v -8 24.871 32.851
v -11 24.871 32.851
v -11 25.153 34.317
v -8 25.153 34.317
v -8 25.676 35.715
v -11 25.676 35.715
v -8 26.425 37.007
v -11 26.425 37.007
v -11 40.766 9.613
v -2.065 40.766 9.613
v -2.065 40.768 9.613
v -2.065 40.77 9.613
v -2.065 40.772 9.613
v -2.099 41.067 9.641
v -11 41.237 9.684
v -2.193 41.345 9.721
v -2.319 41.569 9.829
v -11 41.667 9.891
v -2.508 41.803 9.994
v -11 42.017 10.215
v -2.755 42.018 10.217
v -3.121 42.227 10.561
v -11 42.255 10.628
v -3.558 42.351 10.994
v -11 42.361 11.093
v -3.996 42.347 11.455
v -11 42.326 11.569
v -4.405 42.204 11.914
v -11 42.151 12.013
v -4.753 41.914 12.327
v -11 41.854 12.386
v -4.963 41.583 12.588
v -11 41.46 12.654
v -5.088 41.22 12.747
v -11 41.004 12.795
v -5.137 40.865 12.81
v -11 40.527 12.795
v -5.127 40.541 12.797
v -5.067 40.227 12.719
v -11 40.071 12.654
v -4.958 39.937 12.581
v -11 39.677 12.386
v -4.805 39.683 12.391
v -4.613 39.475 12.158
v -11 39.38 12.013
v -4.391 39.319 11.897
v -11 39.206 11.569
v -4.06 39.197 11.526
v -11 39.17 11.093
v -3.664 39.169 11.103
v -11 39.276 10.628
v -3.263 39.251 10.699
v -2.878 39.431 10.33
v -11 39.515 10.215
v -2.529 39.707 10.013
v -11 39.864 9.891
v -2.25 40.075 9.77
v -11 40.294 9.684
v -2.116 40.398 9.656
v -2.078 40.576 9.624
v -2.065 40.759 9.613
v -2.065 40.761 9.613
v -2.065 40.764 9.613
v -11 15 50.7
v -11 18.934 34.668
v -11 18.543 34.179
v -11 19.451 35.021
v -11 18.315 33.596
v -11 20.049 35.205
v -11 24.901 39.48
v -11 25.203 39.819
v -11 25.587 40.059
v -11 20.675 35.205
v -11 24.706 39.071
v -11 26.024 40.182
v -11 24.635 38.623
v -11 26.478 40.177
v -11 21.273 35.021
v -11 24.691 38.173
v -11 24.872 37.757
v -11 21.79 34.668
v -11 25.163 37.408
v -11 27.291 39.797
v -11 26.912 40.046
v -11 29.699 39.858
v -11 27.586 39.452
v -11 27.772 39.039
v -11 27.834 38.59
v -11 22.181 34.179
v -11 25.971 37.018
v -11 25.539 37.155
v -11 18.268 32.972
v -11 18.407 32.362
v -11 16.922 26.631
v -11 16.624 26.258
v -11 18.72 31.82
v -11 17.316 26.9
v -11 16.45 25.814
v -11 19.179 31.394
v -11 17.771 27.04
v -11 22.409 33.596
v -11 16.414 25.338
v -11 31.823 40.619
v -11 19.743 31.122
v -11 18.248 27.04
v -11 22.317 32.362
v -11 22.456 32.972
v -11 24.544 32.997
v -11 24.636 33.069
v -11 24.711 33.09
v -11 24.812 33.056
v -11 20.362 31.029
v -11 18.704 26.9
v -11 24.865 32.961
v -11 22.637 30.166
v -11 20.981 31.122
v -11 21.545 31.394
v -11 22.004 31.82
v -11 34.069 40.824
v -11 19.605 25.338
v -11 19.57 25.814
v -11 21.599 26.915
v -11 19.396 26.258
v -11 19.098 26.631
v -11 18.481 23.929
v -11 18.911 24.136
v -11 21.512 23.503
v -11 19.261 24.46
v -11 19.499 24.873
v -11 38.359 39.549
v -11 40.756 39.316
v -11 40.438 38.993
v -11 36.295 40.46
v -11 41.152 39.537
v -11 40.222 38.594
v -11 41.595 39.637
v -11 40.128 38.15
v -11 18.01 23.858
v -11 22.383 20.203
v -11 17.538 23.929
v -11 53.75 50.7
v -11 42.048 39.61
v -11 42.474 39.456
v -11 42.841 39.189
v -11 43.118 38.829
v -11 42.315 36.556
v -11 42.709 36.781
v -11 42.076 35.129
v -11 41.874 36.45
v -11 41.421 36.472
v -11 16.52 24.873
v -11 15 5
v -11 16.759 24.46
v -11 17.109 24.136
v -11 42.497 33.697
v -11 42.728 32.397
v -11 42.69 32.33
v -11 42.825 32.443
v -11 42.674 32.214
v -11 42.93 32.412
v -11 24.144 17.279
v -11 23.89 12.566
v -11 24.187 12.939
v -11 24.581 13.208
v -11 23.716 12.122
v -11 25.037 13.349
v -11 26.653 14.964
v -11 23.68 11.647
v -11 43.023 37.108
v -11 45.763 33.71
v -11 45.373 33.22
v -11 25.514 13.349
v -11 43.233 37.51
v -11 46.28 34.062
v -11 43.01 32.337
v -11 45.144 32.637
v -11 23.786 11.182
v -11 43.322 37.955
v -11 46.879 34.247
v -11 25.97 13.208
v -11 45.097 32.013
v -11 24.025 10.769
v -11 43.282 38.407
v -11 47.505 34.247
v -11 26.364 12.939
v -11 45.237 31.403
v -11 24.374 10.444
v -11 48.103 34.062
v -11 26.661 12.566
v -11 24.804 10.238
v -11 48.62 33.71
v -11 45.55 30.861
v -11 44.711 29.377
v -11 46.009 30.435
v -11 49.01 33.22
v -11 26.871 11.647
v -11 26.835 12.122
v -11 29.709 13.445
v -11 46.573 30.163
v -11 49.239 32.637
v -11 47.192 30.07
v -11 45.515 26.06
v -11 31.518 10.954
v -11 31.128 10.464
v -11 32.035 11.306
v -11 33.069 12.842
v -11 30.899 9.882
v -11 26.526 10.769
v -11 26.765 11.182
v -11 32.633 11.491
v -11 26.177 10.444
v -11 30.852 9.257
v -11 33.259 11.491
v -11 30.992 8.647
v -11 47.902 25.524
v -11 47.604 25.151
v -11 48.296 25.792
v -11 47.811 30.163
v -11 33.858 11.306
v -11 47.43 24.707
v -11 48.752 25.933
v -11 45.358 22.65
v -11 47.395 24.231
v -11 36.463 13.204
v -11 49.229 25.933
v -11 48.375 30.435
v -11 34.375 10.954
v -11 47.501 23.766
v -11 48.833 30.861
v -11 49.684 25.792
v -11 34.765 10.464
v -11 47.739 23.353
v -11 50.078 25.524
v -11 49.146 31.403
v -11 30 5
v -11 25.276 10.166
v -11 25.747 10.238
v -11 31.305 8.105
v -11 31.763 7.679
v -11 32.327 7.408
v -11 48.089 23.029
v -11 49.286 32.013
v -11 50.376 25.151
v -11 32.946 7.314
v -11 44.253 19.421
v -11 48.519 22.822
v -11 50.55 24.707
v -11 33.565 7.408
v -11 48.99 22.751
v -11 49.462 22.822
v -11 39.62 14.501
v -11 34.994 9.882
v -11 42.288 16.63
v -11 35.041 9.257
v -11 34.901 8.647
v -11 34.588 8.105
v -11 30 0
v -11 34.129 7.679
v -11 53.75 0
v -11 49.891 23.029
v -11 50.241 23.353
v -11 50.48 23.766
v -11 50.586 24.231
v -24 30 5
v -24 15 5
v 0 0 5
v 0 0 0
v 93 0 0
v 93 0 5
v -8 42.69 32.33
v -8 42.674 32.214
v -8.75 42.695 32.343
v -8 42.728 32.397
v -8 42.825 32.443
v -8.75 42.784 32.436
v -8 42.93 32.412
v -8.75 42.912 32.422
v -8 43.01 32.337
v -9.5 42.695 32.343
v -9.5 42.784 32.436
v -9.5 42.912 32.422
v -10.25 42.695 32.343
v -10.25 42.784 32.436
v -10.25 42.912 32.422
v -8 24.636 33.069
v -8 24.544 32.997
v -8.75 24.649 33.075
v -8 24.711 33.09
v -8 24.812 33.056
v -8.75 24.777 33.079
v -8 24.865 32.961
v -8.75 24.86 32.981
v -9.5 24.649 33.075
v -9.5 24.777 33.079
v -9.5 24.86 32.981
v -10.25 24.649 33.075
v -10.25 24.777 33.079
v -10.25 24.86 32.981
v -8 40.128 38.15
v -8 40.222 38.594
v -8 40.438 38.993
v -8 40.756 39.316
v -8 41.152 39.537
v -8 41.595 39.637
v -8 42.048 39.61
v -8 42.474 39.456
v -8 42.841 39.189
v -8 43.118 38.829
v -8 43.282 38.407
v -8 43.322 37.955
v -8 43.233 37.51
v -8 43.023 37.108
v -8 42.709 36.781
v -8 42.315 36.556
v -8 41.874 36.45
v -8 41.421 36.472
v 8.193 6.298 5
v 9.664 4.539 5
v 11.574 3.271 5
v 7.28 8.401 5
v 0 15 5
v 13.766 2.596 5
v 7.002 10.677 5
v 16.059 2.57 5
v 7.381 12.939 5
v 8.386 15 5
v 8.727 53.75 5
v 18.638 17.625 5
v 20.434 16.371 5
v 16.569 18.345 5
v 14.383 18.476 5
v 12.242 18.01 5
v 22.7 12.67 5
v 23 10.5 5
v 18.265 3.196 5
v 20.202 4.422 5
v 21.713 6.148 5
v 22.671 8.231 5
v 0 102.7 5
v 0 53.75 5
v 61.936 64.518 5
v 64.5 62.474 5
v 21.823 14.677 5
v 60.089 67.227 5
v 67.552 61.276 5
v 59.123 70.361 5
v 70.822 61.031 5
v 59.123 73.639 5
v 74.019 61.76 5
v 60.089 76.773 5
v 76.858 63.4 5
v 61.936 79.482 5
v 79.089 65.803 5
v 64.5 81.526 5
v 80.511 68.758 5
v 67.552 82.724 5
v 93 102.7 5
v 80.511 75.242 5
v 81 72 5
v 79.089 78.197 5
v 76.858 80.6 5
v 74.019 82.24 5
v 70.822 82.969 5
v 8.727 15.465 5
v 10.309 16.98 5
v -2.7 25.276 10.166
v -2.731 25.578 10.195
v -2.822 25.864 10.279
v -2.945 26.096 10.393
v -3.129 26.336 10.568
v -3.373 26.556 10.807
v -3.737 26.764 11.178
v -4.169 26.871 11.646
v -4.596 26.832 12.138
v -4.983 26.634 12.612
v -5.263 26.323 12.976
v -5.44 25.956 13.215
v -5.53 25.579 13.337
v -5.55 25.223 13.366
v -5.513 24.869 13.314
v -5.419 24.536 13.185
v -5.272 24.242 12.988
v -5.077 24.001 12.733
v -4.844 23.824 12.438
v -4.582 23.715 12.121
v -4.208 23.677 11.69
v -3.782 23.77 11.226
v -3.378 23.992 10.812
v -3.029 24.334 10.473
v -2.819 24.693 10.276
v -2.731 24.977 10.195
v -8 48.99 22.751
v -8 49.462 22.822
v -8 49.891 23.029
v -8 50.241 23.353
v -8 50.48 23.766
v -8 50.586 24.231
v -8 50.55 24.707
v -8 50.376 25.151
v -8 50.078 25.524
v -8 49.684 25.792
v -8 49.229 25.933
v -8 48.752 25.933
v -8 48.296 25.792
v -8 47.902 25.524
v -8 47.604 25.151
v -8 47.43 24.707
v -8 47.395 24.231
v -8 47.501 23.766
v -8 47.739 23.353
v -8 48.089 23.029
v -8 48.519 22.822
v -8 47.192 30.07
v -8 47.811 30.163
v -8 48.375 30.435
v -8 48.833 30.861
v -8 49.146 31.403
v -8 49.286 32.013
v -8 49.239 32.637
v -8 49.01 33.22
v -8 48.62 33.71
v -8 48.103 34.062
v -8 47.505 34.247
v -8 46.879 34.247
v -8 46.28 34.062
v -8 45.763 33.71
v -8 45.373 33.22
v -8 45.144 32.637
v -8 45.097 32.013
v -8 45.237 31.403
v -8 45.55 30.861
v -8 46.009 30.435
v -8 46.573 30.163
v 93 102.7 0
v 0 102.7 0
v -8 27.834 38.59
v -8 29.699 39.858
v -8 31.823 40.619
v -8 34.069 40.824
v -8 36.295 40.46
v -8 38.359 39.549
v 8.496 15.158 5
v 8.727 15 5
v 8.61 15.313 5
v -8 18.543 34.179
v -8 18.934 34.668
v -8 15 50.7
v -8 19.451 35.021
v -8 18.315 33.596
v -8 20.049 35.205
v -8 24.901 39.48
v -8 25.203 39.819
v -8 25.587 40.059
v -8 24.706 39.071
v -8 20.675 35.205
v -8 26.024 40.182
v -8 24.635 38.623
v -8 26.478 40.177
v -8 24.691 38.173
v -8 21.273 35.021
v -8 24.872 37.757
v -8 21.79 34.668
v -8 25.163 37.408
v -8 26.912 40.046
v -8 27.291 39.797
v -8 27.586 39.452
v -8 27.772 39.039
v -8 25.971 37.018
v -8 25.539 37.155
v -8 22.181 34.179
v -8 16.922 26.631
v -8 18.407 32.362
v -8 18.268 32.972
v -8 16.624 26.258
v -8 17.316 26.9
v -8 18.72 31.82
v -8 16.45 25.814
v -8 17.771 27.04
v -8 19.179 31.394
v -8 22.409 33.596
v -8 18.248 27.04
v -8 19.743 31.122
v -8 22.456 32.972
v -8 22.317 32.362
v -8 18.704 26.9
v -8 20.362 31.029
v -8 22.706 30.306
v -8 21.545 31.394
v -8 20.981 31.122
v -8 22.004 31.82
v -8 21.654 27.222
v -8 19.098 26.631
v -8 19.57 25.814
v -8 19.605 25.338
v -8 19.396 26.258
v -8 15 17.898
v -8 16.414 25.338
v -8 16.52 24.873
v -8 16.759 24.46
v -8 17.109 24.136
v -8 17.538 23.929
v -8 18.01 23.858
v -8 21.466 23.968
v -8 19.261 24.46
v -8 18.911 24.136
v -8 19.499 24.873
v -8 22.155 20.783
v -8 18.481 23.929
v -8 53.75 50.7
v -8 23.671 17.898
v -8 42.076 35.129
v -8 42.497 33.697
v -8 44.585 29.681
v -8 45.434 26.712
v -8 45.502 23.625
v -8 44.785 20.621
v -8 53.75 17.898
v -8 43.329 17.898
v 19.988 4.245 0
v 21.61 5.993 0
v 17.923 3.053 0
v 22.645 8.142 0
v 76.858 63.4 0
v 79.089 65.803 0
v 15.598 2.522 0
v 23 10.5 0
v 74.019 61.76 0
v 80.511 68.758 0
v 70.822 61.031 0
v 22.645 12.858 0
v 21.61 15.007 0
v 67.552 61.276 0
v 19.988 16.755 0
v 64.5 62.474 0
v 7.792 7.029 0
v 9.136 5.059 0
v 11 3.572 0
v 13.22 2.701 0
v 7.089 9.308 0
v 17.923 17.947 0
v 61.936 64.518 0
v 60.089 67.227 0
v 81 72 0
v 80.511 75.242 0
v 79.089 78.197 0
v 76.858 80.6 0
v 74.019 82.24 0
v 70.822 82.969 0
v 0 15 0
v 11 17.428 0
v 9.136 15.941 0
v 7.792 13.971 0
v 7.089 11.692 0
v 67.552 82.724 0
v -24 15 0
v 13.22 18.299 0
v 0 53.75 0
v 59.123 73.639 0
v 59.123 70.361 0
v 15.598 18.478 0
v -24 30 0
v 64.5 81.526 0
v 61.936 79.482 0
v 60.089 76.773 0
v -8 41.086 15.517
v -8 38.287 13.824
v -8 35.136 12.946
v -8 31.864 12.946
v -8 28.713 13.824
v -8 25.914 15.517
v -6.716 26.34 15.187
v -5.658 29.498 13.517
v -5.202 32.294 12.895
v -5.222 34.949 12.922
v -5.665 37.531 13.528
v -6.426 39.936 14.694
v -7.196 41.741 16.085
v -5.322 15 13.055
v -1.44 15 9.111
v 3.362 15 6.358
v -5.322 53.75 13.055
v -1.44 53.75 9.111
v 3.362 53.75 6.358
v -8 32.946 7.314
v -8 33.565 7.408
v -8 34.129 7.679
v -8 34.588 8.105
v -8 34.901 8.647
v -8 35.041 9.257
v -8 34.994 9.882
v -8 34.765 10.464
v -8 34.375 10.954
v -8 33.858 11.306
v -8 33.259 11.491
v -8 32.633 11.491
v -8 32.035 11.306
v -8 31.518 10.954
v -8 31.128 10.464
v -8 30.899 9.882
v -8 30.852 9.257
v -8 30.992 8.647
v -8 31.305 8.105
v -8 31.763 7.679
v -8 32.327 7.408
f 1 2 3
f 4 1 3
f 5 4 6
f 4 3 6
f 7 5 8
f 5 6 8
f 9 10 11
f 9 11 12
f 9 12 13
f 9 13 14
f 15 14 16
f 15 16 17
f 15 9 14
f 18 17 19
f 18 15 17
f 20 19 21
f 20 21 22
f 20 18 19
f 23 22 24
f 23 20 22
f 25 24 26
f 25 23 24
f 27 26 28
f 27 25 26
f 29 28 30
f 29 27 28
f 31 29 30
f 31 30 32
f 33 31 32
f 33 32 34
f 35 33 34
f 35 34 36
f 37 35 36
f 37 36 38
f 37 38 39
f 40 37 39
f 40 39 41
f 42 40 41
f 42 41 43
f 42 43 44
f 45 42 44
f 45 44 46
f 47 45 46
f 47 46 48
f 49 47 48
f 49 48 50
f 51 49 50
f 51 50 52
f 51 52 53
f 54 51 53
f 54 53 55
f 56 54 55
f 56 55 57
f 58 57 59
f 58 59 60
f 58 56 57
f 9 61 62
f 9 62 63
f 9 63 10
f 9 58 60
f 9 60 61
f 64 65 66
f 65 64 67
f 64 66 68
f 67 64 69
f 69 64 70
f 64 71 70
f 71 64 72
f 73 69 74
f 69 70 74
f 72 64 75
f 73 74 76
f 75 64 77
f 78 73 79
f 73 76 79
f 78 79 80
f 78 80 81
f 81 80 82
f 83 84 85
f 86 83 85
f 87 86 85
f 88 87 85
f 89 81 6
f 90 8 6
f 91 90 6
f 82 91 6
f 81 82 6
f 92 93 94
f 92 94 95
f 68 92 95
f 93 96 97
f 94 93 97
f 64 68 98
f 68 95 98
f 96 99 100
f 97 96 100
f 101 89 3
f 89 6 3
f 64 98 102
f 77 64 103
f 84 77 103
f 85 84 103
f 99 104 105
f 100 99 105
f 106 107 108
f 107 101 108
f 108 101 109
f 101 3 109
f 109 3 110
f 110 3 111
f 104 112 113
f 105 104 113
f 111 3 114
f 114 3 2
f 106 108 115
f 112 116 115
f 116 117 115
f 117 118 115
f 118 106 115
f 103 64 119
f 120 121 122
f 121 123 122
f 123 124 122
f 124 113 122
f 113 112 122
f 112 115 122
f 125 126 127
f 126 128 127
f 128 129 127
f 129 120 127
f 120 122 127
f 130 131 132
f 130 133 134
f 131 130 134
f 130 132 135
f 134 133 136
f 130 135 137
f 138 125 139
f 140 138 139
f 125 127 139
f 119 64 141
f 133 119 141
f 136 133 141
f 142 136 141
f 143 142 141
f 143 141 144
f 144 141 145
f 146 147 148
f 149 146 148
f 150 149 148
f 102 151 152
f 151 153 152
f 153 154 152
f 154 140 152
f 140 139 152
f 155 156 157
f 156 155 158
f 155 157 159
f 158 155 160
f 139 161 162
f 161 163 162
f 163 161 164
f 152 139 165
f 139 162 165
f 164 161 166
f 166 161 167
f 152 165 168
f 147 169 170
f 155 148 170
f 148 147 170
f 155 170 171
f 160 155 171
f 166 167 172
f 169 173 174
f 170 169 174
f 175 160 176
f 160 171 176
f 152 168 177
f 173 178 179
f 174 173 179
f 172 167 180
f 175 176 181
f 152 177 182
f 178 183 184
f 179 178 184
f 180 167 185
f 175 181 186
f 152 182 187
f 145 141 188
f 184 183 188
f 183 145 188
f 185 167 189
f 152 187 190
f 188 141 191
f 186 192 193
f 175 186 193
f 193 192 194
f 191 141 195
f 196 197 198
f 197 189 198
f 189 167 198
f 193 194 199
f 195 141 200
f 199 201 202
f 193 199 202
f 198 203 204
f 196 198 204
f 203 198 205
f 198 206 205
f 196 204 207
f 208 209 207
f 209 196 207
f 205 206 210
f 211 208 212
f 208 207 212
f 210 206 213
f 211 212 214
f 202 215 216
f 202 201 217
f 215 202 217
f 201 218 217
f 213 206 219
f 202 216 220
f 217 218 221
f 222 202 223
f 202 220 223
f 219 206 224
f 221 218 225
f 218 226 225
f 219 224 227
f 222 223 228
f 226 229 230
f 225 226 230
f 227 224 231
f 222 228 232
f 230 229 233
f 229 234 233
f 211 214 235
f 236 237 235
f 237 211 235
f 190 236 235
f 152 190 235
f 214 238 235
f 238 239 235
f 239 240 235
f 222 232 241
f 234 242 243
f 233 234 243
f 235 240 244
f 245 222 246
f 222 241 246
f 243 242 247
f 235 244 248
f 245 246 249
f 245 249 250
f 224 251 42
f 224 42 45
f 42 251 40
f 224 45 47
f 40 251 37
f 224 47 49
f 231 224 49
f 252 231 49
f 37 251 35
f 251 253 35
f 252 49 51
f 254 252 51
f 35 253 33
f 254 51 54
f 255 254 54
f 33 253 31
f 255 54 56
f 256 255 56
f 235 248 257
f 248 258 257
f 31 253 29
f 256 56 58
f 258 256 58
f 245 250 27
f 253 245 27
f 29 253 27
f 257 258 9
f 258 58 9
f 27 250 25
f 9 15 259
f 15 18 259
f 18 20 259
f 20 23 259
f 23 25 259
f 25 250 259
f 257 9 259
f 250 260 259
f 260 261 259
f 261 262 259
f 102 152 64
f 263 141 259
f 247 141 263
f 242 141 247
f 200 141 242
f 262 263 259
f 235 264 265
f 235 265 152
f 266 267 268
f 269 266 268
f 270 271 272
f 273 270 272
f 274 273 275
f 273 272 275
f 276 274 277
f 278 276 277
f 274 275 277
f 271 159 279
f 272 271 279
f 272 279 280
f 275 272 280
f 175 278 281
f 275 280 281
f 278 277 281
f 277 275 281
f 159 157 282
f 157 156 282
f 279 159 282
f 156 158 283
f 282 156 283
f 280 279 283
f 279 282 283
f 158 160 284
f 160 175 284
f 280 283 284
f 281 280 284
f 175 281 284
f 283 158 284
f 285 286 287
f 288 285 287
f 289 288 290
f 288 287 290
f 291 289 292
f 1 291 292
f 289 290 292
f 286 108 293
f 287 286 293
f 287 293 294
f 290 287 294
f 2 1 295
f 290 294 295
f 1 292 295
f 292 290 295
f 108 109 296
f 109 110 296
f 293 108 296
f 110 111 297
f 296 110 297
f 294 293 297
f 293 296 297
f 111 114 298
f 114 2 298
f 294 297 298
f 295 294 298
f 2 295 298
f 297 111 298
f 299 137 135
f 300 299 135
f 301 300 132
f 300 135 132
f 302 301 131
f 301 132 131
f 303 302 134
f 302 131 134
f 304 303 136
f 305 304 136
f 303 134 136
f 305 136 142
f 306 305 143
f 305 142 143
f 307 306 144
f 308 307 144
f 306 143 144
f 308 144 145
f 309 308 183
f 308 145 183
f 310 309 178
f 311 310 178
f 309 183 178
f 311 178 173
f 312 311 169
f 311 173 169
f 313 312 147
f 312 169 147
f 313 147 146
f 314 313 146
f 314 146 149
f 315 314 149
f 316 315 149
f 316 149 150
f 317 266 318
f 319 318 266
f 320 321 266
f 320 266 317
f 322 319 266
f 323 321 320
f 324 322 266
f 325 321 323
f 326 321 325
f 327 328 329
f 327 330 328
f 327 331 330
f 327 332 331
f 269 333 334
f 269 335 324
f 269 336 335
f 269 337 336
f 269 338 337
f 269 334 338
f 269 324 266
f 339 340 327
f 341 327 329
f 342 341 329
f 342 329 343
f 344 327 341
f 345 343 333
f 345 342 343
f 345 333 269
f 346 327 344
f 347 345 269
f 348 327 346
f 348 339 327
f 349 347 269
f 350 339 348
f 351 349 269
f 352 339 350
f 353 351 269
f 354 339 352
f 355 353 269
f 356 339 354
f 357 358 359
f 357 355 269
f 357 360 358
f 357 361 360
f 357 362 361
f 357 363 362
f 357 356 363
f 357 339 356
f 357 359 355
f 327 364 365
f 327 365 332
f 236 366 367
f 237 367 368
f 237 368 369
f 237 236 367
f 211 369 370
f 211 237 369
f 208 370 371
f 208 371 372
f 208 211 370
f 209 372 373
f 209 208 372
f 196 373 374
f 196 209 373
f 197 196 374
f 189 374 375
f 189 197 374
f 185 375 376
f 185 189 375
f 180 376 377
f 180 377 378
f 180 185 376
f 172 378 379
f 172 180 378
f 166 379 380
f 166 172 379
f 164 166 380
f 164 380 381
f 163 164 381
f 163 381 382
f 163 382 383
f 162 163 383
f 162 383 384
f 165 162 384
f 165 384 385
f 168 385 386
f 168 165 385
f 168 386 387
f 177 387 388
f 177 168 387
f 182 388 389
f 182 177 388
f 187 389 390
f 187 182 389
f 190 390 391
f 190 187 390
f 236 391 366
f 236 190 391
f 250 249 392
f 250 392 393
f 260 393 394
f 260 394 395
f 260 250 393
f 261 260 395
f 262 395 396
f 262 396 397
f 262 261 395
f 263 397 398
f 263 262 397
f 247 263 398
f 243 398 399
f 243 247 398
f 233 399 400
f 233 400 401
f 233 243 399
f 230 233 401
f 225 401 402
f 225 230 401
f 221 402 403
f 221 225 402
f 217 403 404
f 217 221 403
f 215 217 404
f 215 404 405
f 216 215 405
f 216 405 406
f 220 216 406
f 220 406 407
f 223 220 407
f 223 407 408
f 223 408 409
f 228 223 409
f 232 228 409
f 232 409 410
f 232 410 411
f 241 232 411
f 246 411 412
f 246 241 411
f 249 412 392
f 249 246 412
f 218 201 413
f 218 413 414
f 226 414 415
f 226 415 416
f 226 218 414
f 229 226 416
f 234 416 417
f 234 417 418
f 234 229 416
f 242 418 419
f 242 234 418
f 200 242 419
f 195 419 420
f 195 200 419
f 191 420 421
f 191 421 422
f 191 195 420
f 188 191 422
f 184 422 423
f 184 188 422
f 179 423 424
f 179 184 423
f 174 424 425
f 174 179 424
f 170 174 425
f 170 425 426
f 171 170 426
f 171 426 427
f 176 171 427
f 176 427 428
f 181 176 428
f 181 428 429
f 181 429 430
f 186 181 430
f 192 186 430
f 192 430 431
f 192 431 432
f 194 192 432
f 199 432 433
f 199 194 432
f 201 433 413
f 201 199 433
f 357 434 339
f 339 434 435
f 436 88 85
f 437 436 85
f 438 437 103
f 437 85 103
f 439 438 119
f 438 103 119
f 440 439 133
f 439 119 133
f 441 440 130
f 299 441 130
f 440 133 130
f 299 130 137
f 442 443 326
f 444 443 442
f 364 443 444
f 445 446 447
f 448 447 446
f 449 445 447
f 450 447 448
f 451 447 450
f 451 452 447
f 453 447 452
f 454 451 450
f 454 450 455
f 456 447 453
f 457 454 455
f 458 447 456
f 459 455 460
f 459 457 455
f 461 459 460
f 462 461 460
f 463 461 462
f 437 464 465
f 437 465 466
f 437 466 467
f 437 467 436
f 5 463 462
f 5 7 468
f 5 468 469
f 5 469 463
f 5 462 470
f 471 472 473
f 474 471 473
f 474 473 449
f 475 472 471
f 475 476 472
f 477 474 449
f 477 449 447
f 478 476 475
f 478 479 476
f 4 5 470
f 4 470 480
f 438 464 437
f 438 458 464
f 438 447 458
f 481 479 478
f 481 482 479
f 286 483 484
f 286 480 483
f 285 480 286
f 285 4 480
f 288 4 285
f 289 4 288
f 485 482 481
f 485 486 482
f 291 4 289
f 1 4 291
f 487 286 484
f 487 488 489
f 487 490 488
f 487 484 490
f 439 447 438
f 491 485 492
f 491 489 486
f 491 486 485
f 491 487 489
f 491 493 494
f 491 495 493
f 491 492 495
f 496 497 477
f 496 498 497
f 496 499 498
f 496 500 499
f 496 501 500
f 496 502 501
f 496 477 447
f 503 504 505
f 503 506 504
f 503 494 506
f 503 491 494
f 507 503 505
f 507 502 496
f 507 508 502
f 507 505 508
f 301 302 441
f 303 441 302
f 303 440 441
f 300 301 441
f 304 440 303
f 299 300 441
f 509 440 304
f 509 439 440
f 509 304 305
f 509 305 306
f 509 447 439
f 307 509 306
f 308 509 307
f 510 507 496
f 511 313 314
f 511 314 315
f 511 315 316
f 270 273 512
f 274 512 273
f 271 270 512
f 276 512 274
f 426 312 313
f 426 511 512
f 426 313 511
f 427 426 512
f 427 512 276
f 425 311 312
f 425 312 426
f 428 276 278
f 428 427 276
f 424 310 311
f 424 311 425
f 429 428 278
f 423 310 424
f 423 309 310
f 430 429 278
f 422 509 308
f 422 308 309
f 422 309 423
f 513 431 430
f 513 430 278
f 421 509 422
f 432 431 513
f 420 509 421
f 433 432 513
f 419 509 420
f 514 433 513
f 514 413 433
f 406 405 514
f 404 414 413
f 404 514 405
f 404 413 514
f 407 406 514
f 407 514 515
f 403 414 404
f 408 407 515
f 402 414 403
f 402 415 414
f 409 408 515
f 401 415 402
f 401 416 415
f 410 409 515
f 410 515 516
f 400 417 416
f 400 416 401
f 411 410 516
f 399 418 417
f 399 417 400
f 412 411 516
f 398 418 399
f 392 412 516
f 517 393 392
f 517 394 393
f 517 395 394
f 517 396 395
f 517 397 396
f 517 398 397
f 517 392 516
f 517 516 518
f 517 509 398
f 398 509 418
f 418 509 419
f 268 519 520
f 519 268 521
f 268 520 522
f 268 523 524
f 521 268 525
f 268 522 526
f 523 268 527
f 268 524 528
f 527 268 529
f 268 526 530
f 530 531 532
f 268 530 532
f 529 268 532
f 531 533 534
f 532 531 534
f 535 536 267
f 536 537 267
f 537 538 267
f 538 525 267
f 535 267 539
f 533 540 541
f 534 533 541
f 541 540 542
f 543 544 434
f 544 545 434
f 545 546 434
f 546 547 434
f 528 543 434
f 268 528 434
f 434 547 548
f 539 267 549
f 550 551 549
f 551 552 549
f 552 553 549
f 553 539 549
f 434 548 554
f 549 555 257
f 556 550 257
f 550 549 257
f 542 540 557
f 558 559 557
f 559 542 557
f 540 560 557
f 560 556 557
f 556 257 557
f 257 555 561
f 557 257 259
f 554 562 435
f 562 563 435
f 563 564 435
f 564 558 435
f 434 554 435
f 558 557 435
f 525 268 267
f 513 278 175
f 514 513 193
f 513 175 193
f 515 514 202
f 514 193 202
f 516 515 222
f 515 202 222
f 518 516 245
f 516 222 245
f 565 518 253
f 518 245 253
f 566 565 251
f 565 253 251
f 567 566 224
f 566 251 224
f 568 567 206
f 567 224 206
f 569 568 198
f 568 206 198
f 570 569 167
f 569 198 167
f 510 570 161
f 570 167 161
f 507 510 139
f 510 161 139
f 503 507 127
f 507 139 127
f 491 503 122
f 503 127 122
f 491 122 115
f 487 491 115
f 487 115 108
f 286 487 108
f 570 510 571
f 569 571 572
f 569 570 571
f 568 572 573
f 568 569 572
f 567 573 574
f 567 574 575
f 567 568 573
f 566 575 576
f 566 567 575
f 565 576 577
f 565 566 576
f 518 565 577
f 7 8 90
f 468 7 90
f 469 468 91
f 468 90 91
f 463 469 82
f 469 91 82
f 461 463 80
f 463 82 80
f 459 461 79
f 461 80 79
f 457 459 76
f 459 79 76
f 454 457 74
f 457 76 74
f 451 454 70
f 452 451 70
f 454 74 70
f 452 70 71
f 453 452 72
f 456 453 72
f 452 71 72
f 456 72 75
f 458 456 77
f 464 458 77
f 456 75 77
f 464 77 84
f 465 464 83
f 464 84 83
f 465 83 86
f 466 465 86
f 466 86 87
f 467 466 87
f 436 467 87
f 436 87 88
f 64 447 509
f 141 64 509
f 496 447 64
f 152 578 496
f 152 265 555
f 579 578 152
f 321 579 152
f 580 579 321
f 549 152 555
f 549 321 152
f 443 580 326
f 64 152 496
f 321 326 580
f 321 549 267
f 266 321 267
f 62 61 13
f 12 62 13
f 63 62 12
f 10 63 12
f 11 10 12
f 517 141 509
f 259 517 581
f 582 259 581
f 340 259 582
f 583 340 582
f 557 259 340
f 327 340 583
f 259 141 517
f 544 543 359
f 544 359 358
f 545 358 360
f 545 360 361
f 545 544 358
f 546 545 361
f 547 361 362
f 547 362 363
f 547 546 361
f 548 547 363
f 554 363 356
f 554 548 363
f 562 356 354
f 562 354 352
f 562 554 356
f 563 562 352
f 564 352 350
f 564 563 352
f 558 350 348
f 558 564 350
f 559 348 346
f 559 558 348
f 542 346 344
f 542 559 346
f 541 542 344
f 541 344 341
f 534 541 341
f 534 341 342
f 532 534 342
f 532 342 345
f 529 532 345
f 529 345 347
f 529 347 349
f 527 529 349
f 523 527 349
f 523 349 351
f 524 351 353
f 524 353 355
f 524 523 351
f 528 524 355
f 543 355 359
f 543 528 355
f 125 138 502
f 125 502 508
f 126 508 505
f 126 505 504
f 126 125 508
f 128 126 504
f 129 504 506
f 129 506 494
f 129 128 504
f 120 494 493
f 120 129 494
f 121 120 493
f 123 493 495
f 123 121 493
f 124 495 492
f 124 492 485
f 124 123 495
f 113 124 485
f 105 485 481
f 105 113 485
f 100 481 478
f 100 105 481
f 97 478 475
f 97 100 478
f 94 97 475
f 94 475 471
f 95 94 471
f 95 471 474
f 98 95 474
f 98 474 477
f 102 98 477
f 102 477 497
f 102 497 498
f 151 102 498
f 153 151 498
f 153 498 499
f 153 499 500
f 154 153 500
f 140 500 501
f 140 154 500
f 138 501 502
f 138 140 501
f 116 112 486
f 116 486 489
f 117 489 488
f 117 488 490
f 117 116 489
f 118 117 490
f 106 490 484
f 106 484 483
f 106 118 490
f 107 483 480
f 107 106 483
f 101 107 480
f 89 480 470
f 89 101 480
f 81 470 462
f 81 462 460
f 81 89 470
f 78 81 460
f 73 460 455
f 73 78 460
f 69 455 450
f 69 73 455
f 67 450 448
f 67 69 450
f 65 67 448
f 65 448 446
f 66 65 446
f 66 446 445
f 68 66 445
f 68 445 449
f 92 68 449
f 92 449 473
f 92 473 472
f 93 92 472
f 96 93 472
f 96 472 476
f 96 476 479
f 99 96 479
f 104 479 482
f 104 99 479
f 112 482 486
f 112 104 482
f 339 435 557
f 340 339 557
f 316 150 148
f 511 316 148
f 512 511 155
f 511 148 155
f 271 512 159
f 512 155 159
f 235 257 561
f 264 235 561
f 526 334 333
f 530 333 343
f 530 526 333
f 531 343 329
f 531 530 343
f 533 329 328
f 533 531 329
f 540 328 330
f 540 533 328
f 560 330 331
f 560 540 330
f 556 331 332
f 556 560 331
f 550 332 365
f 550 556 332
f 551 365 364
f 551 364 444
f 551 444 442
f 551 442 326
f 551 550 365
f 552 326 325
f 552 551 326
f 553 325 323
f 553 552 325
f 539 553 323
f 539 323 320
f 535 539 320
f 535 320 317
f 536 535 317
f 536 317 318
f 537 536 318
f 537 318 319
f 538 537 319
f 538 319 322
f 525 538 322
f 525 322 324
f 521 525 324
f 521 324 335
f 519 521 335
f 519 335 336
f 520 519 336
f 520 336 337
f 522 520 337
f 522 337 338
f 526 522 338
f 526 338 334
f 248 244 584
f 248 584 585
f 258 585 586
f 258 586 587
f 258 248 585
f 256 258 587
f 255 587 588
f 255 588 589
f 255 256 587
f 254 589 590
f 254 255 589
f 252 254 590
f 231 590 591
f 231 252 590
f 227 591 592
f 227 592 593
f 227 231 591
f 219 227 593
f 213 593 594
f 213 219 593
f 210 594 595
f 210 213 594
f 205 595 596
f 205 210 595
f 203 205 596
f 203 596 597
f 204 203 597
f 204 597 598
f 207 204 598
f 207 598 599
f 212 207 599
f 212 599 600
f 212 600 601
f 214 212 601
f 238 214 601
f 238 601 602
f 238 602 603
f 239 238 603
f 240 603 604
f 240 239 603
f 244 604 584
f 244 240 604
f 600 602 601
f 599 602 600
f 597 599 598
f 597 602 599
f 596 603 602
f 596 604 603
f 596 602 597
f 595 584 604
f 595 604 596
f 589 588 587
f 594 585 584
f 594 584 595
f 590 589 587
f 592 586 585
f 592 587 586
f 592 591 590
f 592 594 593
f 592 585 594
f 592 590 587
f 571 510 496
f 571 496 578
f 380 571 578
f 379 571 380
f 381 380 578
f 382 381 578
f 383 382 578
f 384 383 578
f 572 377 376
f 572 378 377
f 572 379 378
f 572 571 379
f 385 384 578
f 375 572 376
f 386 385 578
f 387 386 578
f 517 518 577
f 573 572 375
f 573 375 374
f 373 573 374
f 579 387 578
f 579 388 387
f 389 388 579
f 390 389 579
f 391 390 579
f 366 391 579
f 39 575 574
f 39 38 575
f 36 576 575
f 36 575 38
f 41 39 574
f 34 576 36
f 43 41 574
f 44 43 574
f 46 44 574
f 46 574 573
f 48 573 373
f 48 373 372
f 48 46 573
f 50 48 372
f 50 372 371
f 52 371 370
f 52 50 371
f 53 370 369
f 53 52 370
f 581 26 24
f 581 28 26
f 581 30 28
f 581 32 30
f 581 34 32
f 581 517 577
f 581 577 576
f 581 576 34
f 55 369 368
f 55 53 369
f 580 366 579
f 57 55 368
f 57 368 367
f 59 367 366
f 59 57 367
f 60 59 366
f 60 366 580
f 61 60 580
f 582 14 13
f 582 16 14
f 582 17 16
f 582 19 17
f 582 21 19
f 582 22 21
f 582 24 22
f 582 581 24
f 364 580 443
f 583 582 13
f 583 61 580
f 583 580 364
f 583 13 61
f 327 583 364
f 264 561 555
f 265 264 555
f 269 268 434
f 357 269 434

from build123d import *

# Parameters (mm, degrees)
SKETCH1_R                 = 8
SKETCH1_R_2               = 11
BOSS_EXTRUDE1_DEPTH       = 5
BOSS_EXTRUDE2_DEPTH       = 11
BOSS_EXTRUDE3_OUTLINE_R   = 1.6
BOSS_EXTRUDE3_OUTLINE_R_2 = 2.1
BOSS_EXTRUDE3_DEPTH       = 3
SKETCH3_W                 = 15
SKETCH3_H                 = 38.75
CUT_EXTRUDE1_DEPTH        = 3
BOSS_EXTRUDE4_REACH       = 120.779
CUT_EXTRUDE3_START        = 3
CUT_EXTRUDE3_OUTLINE_R    = 1.6
CUT_EXTRUDE3_DEPTH        = 5.935416332


# Read off the part's stored shape, not the designer's step: Boss-Extrude3, Cut-Extrude3
with BuildPart() as part:
    # Sketch1 → Boss-Extrude1 (new body)
    with BuildSketch(Plane.XY):
        Polygon((-24, 15), (0, 15), (0, 0), (93, 0), (93, 102.7), (0, 102.7), (0, 30), (-24, 30), align=None)
        with Locations((15, 10.5)):
            Circle(SKETCH1_R, mode=Mode.SUBTRACT)
        with Locations((70, 72)):
            Circle(SKETCH1_R_2, mode=Mode.SUBTRACT)
    extrude(amount=BOSS_EXTRUDE1_DEPTH)

    # Sketch2 → Boss-Extrude2 (add)
    with BuildSketch(Plane(origin=(-11, 0, 0), x_dir=(0, 0, -1), z_dir=(1, 0, 0))):
        Polygon((-6.40446571, 53.75), (-6.40446571, 33.5), (-6.40446571, 30), (0, 30), (0, 53.75), align=None)
    extrude(amount=BOSS_EXTRUDE2_DEPTH)

    # Boss-Extrude3 outline → Boss-Extrude3 (add)
    with BuildSketch(Plane(origin=(-11, 0, 0), x_dir=(0, 0, -1), z_dir=(1, 0, 0))):
        Polygon((-65.7, 15), (-5, 15), (-5, 30), (-6.40446571, 30), (-6.40446571, 53.75), (-65.7, 53.75), align=None)
        with Locations((-25.458037139, 18.009888358)):
            Circle(BOSS_EXTRUDE3_OUTLINE_R, mode=Mode.SUBTRACT)
        with Locations((-33.128928451, 20.361955525)):
            Circle(BOSS_EXTRUDE3_OUTLINE_R_2, mode=Mode.SUBTRACT)
        with BuildLine():
            ThreePointArc((-36.471534651, 41.421088598), (-34.422063775, 42.316430041), (-32.214396715, 42.674443066))
            add(Edge.make_bspline(
                [(-32.214396715, 42.674443066), (-32.258484047, 42.672889926), (-32.30288803, 42.678244048), (-32.383949881, 42.711721435), (-32.420720422, 42.742067925), (-32.450943892, 42.825768035), (-32.442187299, 42.872669516), (-32.401895098, 42.950423281), (-32.37149194, 42.983188581), (-32.336739051, 43.010347732)],
                knots=[0, 0, 0, 0, 0.25, 0.25, 0.5, 0.5, 0.75, 0.75, 1, 1, 1, 1], degree=3))
            ThreePointArc((-32.336739051, 43.010347732), (-12.84214513, 33.068927831), (-32.99665635, 24.544451349))
            add(Edge.make_bspline(
                [(-32.99665635, 24.544451349), (-33.029388791, 24.574028225), (-33.057393425, 24.608892702), (-33.092046693, 24.689435058), (-33.097377316, 24.736767464), (-33.061272852, 24.818024197), (-33.022299349, 24.845743133), (-32.93918463, 24.87327764), (-32.894502735, 24.8754612), (-32.850648228, 24.870765952)],
                knots=[0, 0, 0, 0, 0.25, 0.25, 0.5, 0.5, 0.75, 0.75, 1, 1, 1, 1], degree=3))
            ThreePointArc((-32.850648228, 24.870765952), (-35.02712744, 25.385455582), (-37.007457913, 26.424810377))
            ThreePointArc((-37.007457913, 26.424810377), (-39.660439788, 25.039720747), (-38.589504277, 27.83433758))
            ThreePointArc((-38.589504277, 27.83433758), (-40.824282289, 34.06892783), (-38.150161467, 40.128088348))
            ThreePointArc((-38.150161467, 40.128088348), (-39.018876857, 42.992022649), (-36.471534651, 41.421088598))
        make_face(mode=Mode.SUBTRACT)
        with Locations((-11.766421235, 25.275537259)):
            Circle(BOSS_EXTRUDE3_OUTLINE_R, mode=Mode.SUBTRACT)
        with Locations((-9.414354068, 32.946428571)):
            Circle(BOSS_EXTRUDE3_OUTLINE_R_2, mode=Mode.SUBTRACT)
        with Locations((-11.212849807, 40.765648901)):
            Circle(BOSS_EXTRUDE3_OUTLINE_R, mode=Mode.SUBTRACT)
        with Locations((-32.170114611, 47.191615903)):
            Circle(BOSS_EXTRUDE3_OUTLINE_R_2, mode=Mode.SUBTRACT)
        with Locations((-24.350894282, 48.990111642)):
            Circle(BOSS_EXTRUDE3_OUTLINE_R, mode=Mode.SUBTRACT)
    extrude(amount=BOSS_EXTRUDE3_DEPTH)

    # Sketch3 → Cut-Extrude1 (cut)
    with BuildSketch(Plane(origin=(-8, 0, 0), x_dir=(0, 0, -1), z_dir=(1, 0, 0))):
        with Locations((-58.2, 34.375)):
            Rectangle(SKETCH3_W, SKETCH3_H)
    extrude(amount=-CUT_EXTRUDE1_DEPTH, mode=Mode.SUBTRACT)

    # Boss-Extrude4: up to this face of the body (flat: up to its plane)
    boss_extrude4_end = Plane(part.part.faces().sort_by_distance((-10.666861144, 15, 16.018028005))[0])
    # Sketch4 → Boss-Extrude4 (add, up to the picked face)
    with BuildSketch(Plane(origin=(0, 53.75, 0), x_dir=(1, 0, 0), z_dir=(0, 1, 0)), mode=Mode.PRIVATE) as boss_extrude4_sk1:
        with BuildLine():
            Line((8.727174225, -5), (-8, -5))
            Line((-8, -5), (-8, -17.898489496))
            ThreePointArc((-8, -17.898489496), (-1.439507221, -9.110934277), (8.727174225, -5))
        make_face()
    boss_extrude4_tool1 = split(extrude(boss_extrude4_sk1.sketch, amount=-BOSS_EXTRUDE4_REACH, mode=Mode.PRIVATE), bisect_by=boss_extrude4_end, keep=Keep.BOTH, mode=Mode.PRIVATE)
    add(boss_extrude4_tool1.solids().sort_by(Axis((-3.750344, 53.75, 8.522384), (0, -1, 0)))[0])

    # Cut-Extrude3 outline → Cut-Extrude3 (cut)
    with BuildSketch(Plane(origin=(-11, 0, 0), x_dir=(0, 0, -1), z_dir=(1, 0, 0)).offset(CUT_EXTRUDE3_START)):
        with BuildLine():
            ThreePointArc((-19, 22.972764576), (-12.834444956, 33.5), (-19, 44.027235424))
            Line((-19, 44.027235424), (-19, 22.972764576))
        make_face()
        with Locations((-11.766421235, 25.275537259)):
            Circle(CUT_EXTRUDE3_OUTLINE_R)
        with Locations((-11.212849807, 40.765648901)):
            Circle(CUT_EXTRUDE3_OUTLINE_R)
    extrude(amount=CUT_EXTRUDE3_DEPTH, mode=Mode.SUBTRACT)


solid = part.part
